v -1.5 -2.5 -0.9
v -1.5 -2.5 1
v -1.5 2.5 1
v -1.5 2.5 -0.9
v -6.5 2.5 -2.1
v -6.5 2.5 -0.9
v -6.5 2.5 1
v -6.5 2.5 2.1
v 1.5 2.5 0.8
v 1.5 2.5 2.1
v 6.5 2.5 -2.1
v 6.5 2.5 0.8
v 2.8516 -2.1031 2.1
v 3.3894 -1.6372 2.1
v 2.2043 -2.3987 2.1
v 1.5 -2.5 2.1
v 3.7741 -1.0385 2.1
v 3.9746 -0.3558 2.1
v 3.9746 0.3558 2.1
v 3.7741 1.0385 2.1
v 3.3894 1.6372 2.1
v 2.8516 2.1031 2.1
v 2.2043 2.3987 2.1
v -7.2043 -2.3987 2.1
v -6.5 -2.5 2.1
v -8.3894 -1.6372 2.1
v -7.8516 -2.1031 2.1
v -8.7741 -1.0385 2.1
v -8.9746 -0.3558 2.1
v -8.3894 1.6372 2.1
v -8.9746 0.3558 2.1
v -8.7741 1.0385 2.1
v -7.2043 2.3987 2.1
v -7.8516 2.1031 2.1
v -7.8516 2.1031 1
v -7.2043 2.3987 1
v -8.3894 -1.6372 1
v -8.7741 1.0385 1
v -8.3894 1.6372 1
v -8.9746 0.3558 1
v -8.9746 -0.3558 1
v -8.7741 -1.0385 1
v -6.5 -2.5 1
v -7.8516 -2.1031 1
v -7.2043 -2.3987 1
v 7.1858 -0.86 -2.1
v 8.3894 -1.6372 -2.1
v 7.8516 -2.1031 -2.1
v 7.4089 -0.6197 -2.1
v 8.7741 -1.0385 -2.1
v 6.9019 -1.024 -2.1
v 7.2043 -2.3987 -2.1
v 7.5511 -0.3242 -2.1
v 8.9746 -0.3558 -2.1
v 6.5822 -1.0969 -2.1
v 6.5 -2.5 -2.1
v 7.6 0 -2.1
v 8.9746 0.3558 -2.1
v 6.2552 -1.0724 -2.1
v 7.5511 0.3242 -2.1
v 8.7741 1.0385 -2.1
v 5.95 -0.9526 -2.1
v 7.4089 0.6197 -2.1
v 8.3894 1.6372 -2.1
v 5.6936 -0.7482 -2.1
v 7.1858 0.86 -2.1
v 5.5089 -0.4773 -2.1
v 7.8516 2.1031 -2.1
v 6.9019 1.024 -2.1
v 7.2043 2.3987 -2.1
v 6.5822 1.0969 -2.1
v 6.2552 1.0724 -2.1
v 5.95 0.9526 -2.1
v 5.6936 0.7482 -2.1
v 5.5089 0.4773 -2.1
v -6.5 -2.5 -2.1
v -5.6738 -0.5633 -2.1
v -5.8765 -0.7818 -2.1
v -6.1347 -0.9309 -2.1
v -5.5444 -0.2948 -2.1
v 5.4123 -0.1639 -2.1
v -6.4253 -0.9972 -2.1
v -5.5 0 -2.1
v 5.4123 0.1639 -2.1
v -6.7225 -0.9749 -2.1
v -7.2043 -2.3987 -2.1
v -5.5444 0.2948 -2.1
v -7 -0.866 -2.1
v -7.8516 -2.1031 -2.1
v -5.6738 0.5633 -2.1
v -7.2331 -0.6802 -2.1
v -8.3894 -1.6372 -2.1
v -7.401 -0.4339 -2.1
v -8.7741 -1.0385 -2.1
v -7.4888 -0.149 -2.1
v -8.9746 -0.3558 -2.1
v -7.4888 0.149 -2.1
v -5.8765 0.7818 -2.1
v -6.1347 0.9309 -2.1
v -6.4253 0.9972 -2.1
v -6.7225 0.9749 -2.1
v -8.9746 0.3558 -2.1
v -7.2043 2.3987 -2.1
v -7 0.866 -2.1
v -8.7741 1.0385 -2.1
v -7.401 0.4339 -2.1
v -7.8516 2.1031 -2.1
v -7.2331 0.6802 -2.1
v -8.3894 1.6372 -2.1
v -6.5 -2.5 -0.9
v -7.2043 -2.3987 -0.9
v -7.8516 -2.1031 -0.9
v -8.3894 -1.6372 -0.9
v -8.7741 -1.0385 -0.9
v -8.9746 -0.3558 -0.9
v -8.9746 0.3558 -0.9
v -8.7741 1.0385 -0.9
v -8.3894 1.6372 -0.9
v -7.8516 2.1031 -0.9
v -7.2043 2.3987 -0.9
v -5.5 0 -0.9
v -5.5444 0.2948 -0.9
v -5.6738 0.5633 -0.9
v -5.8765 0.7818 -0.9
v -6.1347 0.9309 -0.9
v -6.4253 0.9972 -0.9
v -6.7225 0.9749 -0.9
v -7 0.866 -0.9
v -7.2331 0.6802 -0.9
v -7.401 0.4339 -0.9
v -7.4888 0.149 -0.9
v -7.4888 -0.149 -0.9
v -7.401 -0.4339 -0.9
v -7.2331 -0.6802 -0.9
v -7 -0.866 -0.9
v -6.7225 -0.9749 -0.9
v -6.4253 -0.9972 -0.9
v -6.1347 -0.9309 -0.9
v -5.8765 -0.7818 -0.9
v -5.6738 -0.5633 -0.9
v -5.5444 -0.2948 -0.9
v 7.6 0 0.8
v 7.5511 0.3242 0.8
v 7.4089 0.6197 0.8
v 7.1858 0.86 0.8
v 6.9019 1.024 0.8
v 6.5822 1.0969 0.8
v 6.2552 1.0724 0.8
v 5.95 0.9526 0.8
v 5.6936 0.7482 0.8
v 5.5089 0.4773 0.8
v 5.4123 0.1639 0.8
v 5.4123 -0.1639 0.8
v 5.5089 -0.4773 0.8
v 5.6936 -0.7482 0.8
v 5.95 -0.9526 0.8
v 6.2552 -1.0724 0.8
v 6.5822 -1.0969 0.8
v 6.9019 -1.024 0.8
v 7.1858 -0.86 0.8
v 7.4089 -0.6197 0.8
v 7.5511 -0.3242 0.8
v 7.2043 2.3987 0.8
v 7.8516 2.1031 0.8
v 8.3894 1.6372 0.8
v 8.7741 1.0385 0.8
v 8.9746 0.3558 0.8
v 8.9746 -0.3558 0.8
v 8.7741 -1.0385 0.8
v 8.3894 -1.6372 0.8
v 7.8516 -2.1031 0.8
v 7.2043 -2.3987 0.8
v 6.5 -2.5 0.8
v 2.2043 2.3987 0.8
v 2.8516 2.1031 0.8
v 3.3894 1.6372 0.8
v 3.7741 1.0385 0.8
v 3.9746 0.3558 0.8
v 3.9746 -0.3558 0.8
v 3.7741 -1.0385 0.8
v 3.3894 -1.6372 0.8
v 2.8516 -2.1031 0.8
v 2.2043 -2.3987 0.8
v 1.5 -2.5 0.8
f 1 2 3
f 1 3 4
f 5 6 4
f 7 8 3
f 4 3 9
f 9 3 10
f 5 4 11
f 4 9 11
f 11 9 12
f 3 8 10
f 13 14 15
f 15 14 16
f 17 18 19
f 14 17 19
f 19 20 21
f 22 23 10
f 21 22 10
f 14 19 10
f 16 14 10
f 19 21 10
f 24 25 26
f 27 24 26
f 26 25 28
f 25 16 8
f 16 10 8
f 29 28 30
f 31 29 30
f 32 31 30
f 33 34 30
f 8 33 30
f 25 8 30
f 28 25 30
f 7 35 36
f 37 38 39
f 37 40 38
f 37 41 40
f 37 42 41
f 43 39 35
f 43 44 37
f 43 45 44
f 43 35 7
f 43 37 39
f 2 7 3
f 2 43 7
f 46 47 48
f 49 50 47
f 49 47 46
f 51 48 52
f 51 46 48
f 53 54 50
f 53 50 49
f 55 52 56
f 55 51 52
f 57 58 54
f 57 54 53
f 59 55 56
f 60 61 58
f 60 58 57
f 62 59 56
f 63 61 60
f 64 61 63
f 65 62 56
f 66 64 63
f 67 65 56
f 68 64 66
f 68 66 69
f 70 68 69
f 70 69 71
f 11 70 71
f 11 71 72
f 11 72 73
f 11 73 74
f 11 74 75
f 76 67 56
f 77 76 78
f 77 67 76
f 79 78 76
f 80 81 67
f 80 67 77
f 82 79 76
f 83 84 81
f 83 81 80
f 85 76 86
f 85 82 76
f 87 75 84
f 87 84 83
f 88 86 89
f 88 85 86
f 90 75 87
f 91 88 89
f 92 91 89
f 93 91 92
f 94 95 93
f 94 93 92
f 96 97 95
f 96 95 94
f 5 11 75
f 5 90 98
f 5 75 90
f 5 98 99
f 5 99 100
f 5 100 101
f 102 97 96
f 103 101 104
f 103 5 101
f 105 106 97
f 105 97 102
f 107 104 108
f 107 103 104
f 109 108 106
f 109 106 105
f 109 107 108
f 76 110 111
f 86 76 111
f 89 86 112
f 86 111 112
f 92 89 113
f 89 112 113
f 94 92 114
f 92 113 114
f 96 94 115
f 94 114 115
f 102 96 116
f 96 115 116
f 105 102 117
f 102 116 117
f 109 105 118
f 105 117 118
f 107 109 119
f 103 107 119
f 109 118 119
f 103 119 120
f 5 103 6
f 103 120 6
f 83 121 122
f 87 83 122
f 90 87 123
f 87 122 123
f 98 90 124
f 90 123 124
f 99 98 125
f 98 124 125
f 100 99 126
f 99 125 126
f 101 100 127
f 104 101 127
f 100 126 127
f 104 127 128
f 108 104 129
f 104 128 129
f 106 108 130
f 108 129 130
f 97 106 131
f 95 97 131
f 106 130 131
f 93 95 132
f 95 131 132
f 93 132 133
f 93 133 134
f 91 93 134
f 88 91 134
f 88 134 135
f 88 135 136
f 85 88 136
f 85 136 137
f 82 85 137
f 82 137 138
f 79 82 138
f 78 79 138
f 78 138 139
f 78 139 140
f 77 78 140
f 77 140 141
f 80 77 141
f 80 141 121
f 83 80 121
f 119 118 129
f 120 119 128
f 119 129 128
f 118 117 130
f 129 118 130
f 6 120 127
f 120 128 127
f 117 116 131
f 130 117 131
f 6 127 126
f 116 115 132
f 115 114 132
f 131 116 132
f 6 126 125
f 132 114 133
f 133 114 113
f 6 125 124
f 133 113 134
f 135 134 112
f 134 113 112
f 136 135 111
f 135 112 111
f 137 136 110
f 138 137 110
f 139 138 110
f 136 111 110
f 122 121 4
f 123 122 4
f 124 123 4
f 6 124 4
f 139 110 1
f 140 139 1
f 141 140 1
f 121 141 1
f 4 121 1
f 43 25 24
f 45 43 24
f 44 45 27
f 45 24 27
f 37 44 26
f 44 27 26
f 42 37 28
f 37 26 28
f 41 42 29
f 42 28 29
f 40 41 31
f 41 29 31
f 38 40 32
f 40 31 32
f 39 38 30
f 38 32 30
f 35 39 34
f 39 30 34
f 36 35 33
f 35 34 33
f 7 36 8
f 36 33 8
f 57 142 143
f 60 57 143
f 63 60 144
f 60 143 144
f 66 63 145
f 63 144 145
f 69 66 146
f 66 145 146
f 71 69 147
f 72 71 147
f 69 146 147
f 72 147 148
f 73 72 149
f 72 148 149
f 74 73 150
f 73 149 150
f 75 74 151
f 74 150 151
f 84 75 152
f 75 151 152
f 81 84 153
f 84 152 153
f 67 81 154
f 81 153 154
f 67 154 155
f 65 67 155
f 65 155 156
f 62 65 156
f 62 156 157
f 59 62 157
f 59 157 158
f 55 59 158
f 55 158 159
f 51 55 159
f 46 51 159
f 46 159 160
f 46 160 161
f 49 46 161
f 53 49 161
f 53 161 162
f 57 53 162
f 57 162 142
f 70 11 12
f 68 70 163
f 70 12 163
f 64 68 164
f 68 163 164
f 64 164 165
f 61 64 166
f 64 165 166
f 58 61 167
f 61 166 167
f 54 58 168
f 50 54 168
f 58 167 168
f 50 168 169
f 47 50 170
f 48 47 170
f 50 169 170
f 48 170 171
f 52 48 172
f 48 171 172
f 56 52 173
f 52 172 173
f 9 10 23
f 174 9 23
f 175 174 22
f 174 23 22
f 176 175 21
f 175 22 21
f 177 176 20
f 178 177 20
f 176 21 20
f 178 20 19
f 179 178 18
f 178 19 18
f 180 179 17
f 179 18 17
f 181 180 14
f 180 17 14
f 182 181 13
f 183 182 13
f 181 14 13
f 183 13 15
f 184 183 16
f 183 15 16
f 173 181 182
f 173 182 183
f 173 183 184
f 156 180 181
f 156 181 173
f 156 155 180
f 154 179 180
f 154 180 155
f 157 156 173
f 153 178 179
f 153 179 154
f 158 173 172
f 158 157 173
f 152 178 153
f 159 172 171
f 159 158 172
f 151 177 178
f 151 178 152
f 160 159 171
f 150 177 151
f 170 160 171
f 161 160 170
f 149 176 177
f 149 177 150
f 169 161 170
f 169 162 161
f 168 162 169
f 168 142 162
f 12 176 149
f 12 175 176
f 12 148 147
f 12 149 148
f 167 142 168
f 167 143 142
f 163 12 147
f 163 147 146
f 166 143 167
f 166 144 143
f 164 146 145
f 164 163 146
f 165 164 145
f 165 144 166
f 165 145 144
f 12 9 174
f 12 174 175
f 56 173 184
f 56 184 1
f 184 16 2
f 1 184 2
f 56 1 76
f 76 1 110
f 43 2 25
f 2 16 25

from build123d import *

# Parameters (mm, degrees)
BOSS_EXTRUDE1_DEPTH     = 2.1
CUT_EXTRUDE1_DEPTH      = 1.3
SKETCH3_R               = 1.1
CUT_EXTRUDE2_DEPTH      = 10.780593029
CUT_EXTRUDE3_DEPTH      = 10.573922916
CUT_EXTRUDE3_DEPTH_BACK = 10.573922916
SKETCH4_W               = 7.5
SKETCH4_H               = 1.9
SKETCH5_R               = 1
CUT_EXTRUDE4_DEPTH      = 10.810708435


with BuildPart() as part:
    # Sketch1 → Boss-Extrude1 (new, symmetric)
    with BuildSketch(Plane.XY):
        with BuildLine():
            Line((6.5, -2.5), (-6.5, -2.5))
            ThreePointArc((-6.5, -2.5), (-9, 0), (-6.5, 2.5))
            Line((-6.5, 2.5), (6.5, 2.5))
            ThreePointArc((6.5, 2.5), (9, 0), (6.5, -2.5))
        make_face()
    extrude(amount=BOSS_EXTRUDE1_DEPTH, both=True)

    # Sketch2 → Cut-Extrude1 (cut)
    with BuildSketch(Plane.XY.offset(2.1)):
        with BuildLine():
            Line((6.5, 2.5), (1.5, 2.5))
            ThreePointArc((1.5, 2.5), (4, 0), (1.5, -2.5))
            Line((1.5, -2.5), (6.5, -2.5))
            ThreePointArc((6.5, -2.5), (9, 0), (6.5, 2.5))
        make_face()
    extrude(amount=-CUT_EXTRUDE1_DEPTH, mode=Mode.SUBTRACT)

    # Sketch3 → Cut-Extrude2 (cut, through all)
    with BuildSketch(Plane.XY.offset(0.8)):
        with Locations((6.5, 0)):
            Circle(SKETCH3_R)
    extrude(amount=-CUT_EXTRUDE2_DEPTH, mode=Mode.SUBTRACT)

    # Sketch4 → Cut-Extrude3 (cut, two sides: drawn at the far end of the back side and taken through both)
    with BuildSketch(Plane(origin=(0, 0, 0), x_dir=(1, 0, 0), z_dir=(0, 1, 0)).offset(-CUT_EXTRUDE3_DEPTH_BACK)):
        with Locations((-5.25, -0.05)):
            Rectangle(SKETCH4_W, SKETCH4_H)
    extrude(amount=CUT_EXTRUDE3_DEPTH + CUT_EXTRUDE3_DEPTH_BACK, mode=Mode.SUBTRACT)

    # Sketch5 → Cut-Extrude4 (cut, through all)
    with BuildSketch(Plane.XY.offset(-0.9)):
        with Locations((-6.5, 0)):
            Circle(SKETCH5_R)
    extrude(amount=-CUT_EXTRUDE4_DEPTH, mode=Mode.SUBTRACT)


solid = part.part
